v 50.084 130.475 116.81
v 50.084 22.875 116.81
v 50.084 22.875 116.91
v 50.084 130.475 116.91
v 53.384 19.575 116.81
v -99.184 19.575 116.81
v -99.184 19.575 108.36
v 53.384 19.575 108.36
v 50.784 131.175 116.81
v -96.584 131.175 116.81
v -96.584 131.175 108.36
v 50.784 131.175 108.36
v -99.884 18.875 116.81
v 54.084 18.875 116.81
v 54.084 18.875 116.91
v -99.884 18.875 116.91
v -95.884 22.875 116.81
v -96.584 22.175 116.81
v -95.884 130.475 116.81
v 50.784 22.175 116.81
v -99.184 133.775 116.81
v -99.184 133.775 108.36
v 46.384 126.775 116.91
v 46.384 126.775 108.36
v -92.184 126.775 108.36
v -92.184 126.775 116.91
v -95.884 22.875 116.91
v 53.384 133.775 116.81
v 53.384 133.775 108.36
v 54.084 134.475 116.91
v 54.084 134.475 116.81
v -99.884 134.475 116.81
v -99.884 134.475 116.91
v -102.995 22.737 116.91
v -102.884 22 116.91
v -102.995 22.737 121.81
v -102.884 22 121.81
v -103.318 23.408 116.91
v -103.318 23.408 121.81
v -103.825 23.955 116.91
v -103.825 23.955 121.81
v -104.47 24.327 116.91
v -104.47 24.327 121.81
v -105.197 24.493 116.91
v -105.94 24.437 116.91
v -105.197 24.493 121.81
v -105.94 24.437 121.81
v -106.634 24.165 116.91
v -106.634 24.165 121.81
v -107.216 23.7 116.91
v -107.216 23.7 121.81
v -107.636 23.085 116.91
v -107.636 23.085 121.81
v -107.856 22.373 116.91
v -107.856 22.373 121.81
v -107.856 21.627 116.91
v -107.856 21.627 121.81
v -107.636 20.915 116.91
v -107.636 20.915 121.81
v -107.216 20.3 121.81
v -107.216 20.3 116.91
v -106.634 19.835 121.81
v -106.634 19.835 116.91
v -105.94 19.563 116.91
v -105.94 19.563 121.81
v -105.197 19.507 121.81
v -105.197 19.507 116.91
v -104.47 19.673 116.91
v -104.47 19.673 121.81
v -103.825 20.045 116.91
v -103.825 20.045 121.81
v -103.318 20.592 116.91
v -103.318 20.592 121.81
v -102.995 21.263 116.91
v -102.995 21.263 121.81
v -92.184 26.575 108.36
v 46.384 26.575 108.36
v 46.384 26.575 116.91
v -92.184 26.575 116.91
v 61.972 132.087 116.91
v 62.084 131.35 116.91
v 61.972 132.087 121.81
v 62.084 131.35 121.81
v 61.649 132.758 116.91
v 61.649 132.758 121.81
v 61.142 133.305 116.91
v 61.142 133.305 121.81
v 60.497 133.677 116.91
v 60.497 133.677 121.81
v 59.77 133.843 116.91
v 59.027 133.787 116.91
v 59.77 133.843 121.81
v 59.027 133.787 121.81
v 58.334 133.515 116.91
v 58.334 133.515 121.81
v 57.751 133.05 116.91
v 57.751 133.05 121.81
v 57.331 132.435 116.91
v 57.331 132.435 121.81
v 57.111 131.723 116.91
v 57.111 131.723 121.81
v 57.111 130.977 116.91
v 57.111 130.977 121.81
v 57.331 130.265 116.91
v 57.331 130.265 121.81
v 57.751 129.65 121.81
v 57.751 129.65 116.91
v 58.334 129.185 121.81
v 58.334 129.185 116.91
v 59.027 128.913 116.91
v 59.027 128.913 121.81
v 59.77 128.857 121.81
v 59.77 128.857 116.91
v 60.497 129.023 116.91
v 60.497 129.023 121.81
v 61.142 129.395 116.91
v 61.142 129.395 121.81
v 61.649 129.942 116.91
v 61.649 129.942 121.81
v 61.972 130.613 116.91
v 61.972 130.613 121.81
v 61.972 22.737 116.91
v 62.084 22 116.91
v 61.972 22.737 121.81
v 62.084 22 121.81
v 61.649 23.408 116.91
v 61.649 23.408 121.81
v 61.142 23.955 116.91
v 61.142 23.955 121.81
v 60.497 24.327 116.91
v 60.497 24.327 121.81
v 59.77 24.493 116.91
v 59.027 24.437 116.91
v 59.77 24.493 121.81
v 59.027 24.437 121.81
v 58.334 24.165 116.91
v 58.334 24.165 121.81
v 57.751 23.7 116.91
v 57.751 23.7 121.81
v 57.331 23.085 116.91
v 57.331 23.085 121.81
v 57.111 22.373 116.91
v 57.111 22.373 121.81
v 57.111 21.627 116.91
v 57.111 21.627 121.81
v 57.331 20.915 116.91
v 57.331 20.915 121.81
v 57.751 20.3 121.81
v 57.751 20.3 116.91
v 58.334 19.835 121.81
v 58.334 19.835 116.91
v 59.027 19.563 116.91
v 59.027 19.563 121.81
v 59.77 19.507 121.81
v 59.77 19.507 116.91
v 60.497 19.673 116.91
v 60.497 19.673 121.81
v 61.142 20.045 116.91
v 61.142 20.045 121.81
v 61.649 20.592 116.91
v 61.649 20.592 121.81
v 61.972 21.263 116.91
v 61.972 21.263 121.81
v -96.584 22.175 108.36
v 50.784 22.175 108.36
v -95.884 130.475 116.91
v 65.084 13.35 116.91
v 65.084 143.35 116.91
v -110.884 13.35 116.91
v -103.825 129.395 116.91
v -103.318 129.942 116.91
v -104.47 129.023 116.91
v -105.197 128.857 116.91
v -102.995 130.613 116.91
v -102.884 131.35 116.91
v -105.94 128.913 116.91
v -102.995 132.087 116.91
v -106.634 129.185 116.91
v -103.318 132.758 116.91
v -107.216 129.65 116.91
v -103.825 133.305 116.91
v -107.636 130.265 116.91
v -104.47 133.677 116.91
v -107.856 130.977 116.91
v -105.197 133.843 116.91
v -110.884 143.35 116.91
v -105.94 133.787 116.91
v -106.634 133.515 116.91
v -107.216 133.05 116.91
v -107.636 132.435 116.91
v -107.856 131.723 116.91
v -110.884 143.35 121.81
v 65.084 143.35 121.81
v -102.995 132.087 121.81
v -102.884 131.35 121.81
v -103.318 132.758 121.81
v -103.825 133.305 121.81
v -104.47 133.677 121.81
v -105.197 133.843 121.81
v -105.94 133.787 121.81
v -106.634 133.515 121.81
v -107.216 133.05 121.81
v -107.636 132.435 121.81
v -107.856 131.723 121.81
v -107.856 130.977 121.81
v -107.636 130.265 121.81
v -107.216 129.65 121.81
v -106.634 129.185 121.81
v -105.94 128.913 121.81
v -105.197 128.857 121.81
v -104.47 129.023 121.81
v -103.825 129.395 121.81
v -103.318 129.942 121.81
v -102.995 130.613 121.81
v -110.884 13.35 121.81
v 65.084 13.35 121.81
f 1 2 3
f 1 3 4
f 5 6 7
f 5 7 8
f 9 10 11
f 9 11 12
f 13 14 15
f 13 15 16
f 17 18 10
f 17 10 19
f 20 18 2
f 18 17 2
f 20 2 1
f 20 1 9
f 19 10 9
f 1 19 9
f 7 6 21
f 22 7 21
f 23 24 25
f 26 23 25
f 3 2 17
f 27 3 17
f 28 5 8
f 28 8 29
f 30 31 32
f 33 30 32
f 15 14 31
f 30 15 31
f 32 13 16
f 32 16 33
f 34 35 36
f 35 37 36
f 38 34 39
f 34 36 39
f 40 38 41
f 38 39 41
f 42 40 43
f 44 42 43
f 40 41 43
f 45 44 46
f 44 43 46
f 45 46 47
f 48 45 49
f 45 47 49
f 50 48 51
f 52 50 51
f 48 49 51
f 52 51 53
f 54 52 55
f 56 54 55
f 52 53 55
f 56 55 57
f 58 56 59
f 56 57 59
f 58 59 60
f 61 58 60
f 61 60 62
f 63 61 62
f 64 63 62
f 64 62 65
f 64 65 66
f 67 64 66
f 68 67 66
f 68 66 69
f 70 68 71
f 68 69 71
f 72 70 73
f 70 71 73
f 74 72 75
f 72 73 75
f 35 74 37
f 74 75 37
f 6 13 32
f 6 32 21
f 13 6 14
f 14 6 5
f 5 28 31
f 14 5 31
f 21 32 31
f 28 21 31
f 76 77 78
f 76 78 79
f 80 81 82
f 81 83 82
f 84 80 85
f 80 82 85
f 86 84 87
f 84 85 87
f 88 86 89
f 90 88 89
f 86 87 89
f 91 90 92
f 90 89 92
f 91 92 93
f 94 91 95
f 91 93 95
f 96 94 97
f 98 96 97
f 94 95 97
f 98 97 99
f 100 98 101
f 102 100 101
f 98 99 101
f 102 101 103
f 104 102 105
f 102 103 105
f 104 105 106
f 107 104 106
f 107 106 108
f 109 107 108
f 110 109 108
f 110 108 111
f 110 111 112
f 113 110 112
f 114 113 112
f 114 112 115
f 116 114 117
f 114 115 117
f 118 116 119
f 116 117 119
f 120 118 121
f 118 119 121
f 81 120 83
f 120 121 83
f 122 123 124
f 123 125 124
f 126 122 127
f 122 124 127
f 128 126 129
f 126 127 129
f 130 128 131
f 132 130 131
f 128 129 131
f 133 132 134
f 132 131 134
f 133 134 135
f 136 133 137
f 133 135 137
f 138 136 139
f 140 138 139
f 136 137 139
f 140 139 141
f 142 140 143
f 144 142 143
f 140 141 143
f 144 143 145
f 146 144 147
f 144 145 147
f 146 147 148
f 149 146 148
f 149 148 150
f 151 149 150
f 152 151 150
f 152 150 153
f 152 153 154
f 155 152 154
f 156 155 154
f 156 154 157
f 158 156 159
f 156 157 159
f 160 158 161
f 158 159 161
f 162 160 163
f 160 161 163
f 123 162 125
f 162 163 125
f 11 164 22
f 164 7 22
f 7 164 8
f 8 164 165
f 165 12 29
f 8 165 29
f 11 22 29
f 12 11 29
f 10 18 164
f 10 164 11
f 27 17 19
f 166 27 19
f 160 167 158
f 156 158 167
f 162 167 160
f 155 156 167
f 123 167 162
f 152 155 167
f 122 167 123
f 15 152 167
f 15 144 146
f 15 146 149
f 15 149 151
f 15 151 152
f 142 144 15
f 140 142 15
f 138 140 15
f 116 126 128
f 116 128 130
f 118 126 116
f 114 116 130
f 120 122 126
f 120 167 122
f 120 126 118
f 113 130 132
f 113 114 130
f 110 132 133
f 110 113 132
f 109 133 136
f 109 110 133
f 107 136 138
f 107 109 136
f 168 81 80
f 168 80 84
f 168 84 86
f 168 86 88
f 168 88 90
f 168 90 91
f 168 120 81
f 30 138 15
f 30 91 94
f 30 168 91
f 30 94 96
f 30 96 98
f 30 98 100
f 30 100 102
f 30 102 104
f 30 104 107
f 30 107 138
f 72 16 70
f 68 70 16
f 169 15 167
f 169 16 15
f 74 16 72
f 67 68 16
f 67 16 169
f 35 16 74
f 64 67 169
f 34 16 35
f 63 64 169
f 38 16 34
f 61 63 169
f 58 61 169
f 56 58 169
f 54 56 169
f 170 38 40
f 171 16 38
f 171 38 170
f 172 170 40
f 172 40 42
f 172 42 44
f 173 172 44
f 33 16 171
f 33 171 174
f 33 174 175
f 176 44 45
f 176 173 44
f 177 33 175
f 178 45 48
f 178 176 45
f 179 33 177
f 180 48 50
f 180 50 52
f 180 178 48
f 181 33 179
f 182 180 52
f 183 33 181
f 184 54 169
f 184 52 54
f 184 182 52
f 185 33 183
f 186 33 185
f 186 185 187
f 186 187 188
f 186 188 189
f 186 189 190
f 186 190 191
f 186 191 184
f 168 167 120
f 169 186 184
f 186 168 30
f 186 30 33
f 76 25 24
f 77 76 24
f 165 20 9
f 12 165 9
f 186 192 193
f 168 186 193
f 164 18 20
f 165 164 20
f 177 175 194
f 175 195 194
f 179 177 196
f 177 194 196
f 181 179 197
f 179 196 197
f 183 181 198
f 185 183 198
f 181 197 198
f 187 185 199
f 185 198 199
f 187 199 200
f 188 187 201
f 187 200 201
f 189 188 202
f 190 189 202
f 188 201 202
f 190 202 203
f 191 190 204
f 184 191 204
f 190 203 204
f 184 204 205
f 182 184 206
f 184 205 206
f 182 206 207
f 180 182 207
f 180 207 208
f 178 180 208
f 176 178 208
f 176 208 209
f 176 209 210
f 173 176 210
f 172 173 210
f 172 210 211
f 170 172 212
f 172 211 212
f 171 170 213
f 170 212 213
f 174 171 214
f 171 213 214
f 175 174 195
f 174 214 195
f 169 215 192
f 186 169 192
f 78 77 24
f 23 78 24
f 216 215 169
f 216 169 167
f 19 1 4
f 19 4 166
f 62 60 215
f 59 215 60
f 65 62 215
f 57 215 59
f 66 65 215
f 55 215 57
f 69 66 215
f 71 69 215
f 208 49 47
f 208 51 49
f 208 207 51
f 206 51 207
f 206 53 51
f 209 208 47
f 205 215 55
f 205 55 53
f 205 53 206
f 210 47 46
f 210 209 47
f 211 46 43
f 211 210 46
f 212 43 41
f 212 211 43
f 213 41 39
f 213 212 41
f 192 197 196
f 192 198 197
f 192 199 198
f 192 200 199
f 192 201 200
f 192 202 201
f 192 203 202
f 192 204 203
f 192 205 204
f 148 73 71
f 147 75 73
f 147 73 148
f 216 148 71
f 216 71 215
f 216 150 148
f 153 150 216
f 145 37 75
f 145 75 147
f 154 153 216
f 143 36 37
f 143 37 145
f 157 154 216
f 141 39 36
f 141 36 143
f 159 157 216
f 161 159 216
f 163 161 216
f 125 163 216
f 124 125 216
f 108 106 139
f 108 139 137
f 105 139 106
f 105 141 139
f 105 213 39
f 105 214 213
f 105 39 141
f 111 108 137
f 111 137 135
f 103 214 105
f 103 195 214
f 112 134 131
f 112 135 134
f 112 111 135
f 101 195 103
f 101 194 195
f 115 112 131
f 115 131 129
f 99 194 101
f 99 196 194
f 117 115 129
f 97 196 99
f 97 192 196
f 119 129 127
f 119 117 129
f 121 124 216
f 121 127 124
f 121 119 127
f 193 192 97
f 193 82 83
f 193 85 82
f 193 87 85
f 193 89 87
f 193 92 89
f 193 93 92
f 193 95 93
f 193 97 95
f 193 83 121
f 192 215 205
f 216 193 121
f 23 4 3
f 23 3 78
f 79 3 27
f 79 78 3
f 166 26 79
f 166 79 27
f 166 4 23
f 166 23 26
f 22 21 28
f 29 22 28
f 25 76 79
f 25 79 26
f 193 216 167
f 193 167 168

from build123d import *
from OCP.BRepFilletAPI import BRepFilletAPI_MakeChamfer

# Parameters (mm, degrees)
SKETCH1_R               = 172.5
BOSS_EXTRUDE1_DEPTH     = 10
SKETCH2_R               = 48.41
CUT_EXTRUDE1_DEPTH      = 10
BOSS_EXTRUDE2_DEPTH     = 5
CUT_EXTRUDE2_DEPTH      = 497
CUT_EXTRUDE6_START      = -497
CUT_EXTRUDE6_DEPTH      = 497
SKETCH6_W               = 195.767044214
SKETCH6_H               = 55
SKETCH6_W_2             = 185.767044214
SKETCH6_H_2             = 45
BOSS_EXTRUDE3_DEPTH     = 133.35
SKETCH7_W               = 185.767044214
SKETCH7_H               = 45
BOSS_EXTRUDE4_DEPTH     = 5
BOSS_EXTRUDE5_DEPTH     = 8
CHAMFER1_SIZE           = 8
CHAMFER1_SIZE2          = 6.250285012
CHAMFER1_PART_2_SIZE    = 8
CHAMFER1_PART_2_SIZE2   = 6.250285012
CHAMFER1_PART_3_SIZE    = 8
CHAMFER1_PART_3_SIZE2   = 6.250285012
FILLET1_R               = 38
SKETCH9_R               = 374.079334695
CUT_EXTRUDE7_DEPTH      = 93
CUT_EXTRUDE8_DEPTH      = 93
CUT_EXTRUDE8_DEPTH_BACK = 93
SKETCH10_R              = 229.38613092
SKETCH10_R_2            = 152.4
SKETCH11_W              = 291.443368419
SKETCH11_H              = 134.798764099
SKETCH11_W_2            = 144.967044214
SKETCH11_H_2            = 55
CUT_EXTRUDE9_DEPTH      = 143
SKETCH12_W              = 5
SKETCH12_H              = 55
BOSS_EXTRUDE6_DEPTH     = 133.35
SKETCH13_R              = 10
CUT_EXTRUDE10_DEPTH     = 58
SKETCH14_W              = 139.967044214
SKETCH14_H              = 45
BOSS_EXTRUDE7_DEPTH     = 5
SKETCH15_W              = 139.967044214
SKETCH15_H              = 123.35
CUT_EXTRUDE11_DEPTH     = 13
SKETCH16_W              = 10
SKETCH16_H              = 133.35
SKETCH16_W_2            = 149.967044214
BOSS_EXTRUDE9_DEPTH     = 17
SKETCH17_W              = 153.967044214
SKETCH17_H              = 115.6
SKETCH17_W_2            = 145.967044214
SKETCH17_H_2            = 107.6
CUT_EXTRUDE12_DEPTH     = 10
CHAMFER2_SIZE           = 10
CHAMFER2_SIZE2          = 5.773502692
SKETCH24_R              = 15
CUT_EXTRUDE16_DEPTH     = 177.5
SKETCH20_W              = 169.967044214
SKETCH20_H              = 3.35
CUT_EXTRUDE17_DEPTH     = 177.5
SKETCH25_W              = 139.967044214
SKETCH25_H              = 38.773502692
BOSS_EXTRUDE11_DEPTH    = 5
SKETCH26_W              = 3
SKETCH26_H              = 130
BOSS_EXTRUDE12_DEPTH    = 17
SKETCH18_R              = 2.5
CUT_EXTRUDE19_DEPTH     = 26
SKETCH27_W              = 152.567044214
SKETCH27_H              = 114.2
SKETCH27_W_2            = 147.367044214
SKETCH27_H_2            = 109
BOSS_EXTRUDE13_DEPTH    = 8.45
SKETCH27_W_3            = 138.567044214
SKETCH27_H_3            = 100.2
BOSS_EXTRUDE13_2_DEPTH  = 8.45
BOSS_EXTRUDE14_START    = 5
SKETCH28_W              = 175.967044214
SKETCH28_H              = 130
SKETCH28_R              = 2.5
BOSS_EXTRUDE14_DEPTH    = 5
SKETCH29_W              = 292.528596907
SKETCH29_H              = 171.315367969
CUT_EXTRUDE20_DEPTH     = 46.55
SKETCH30_W              = 175.967044214
SKETCH30_H              = 130
SKETCH30_W_2            = 153.967044214
SKETCH30_H_2            = 115.6
SKETCH30_W_3            = 145.967044214
SKETCH30_H_3            = 107.6
SKETCH30_W_4            = 138.567044214
SKETCH30_H_4            = 100.2
CUT_EXTRUDE23_DEPTH     = 8.55


with BuildPart() as part:
    # Sketch1 → Boss-Extrude1 (new body)
    with BuildSketch(Plane(origin=(0, 0, 0), x_dir=(1, 0, 0), z_dir=(0, 1, 0))):
        with Locations(Location((0, 0, 0), (0, 0, 270))):
            Circle(SKETCH1_R)
    extrude(amount=BOSS_EXTRUDE1_DEPTH)

    # Sketch2 → Cut-Extrude1 (cut)
    with BuildSketch(Plane(origin=(0, 10, 0), x_dir=(1, 0, 0), z_dir=(0, 1, 0))):
        with Locations((-75.91, -178.72)):
            Circle(SKETCH2_R)
        with Locations((75.91, -178.72)):
            Circle(SKETCH2_R)
    extrude(amount=-CUT_EXTRUDE1_DEPTH, mode=Mode.SUBTRACT)

    # Sketch3 → Boss-Extrude2 (add)
    with BuildSketch(Plane(origin=(0, 10, 0), x_dir=(1, 0, 0), z_dir=(0, 1, 0))):
        with BuildLine():
            Line((-98.968297449, -119.81), (98.968297449, -119.81))
            ThreePointArc((98.968297449, -119.81), (0, 155.4), (-98.968297449, -119.81))
        make_face()
        with BuildLine():
            ThreePointArc((97.883522107, -116.81), (0, 152.4), (-97.883522107, -116.81))
            Line((-97.883522107, -116.81), (97.883522107, -116.81))
        make_face(mode=Mode.SUBTRACT)
    extrude(amount=BOSS_EXTRUDE2_DEPTH)

    # Sketch4 → Cut-Extrude2 (cut)
    with BuildSketch(Plane(origin=(0, 10, 0), x_dir=(1, 0, 0), z_dir=(0, 1, 0))):
        Polygon((-28.261160255, -170.169200565), (28.261160255, -170.169200565), (28.261160255, -183.836149753), (-30.300470404, -183.836149753), align=None)
    extrude(amount=-CUT_EXTRUDE2_DEPTH, mode=Mode.SUBTRACT)

    # Sketch5 → Cut-Extrude6 (cut)
    with BuildSketch(Plane(origin=(0, 10, 0), x_dir=(1, 0, 0), z_dir=(0, 1, 0)).offset(CUT_EXTRUDE6_START)):
        with BuildLine():
            ThreePointArc((26.702080818, 170.420799435), (0, 172.5), (-26.702080818, 170.420799435))
            Line((-26.702080818, 170.420799435), (26.702080818, 170.420799435))
        make_face()
        with BuildLine():
            ThreePointArc((166.525, -45.007492432), (172.5, 0), (166.525, 45.007492432))
            Line((166.525, 45.007492432), (166.525, -45.007492432))
        make_face()
        with BuildLine():
            Line((-166.525, -45.007492432), (-166.525, 45.007492432))
            ThreePointArc((-166.525, 45.007492432), (-172.5, 0), (-166.525, -45.007492432))
        make_face()
    extrude(amount=CUT_EXTRUDE6_DEPTH, mode=Mode.SUBTRACT)

    # Sketch6 → Boss-Extrude3 (add)
    with BuildSketch(Plane(origin=(0, 10, 0), x_dir=(1, 0, 0), z_dir=(0, 1, 0))):
        with Locations((0, -89.31)):
            Rectangle(SKETCH6_W, SKETCH6_H)
        with Locations((0, -89.31)):
            Rectangle(SKETCH6_W_2, SKETCH6_H_2, mode=Mode.SUBTRACT)
    extrude(amount=BOSS_EXTRUDE3_DEPTH)

    # Sketch7 → Boss-Extrude4 (add)
    with BuildSketch(Plane(origin=(0, 10, 0), x_dir=(1, 0, 0), z_dir=(0, 1, 0))):
        with Locations((0, -89.31)):
            Rectangle(SKETCH7_W, SKETCH7_H)
    extrude(amount=BOSS_EXTRUDE4_DEPTH)

    # Sketch8 → Boss-Extrude5 (add)
    with BuildSketch(Plane(origin=(0, 10, 0), x_dir=(1, 0, 0), z_dir=(0, 1, 0))):
        with BuildLine():
            Line((-97.883522107, -61.81), (-112.883522107, -61.81))
            Line((-112.883522107, -61.81), (-112.883522107, -101.267136509))
            ThreePointArc((-112.883522107, -101.267136509), (-105.634768892, -108.807252061), (-97.883522107, -115.829782871))
            Line((-97.883522107, -115.829782871), (-97.883522107, -61.81))
        make_face()
        with BuildLine():
            Line((-88.028513968, -46.81), (-88.028513968, -61.81))
            Line((-88.028513968, -61.81), (97.883522107, -61.81))
            Line((97.883522107, -61.81), (97.883522107, -115.829782871))
            ThreePointArc((97.883522107, -115.829782871), (105.634768892, -108.807252061), (112.883522107, -101.267136509))
            Line((112.883522107, -101.267136509), (112.883522107, -46.81))
            Line((112.883522107, -46.81), (-88.028513968, -46.81))
        make_face()
    extrude(amount=BOSS_EXTRUDE5_DEPTH)

    # Chamfer1
    chamfer1_edges = [part.edges().sort_by_distance(p)[0] for p in [
        (-97.883522107, 18, 88.819891436),
    ]]
    chamfer1_side = [part.faces().sort_by_distance(p)[0] for p in [
        (-97.883522107, 80.599247918, 89.340686997),
    ]]
    chamfer(chamfer1_edges, length=CHAMFER1_SIZE, length2=CHAMFER1_SIZE2, reference=chamfer1_side[0])

    # Chamfer1 part 2
    chamfer1_part_2_edges = [part.edges().sort_by_distance(p)[0] for p in [
        (4.927504069, 18, 61.81),
    ]]
    chamfer1_part_2_side = [part.faces().sort_by_distance(p)[0] for p in [
        (-0.807441513, 80.139082253, 61.81),
    ]]
    chamfer(chamfer1_part_2_edges, length=CHAMFER1_PART_2_SIZE, length2=CHAMFER1_PART_2_SIZE2, reference=chamfer1_part_2_side[0])

    # Chamfer1 part 3
    chamfer1_part_3_edges = [part.edges().sort_by_distance(p)[0] for p in [
        (97.883522107, 18, 88.819891436),
    ]]
    chamfer1_part_3_side = [part.faces().sort_by_distance(p)[0] for p in [
        (97.883522107, 80.599247918, 89.340686997),
    ]]
    chamfer(chamfer1_part_3_edges, length=CHAMFER1_PART_3_SIZE, length2=CHAMFER1_PART_3_SIZE2, reference=chamfer1_part_3_side[0])

    # Fillet1
    # the kernel refuses this fillet: 38 mm, written as the material it adds along each edge
    with BuildSketch(Plane(origin=(-97.883522107, 26, 148.028657271), x_dir=(-0.61566147532566, -0.7880107536067207, 0), z_dir=(0, 0, -1))) as fillet1_piece_1_section:
        with BuildLine():
            CenterArc((13.24591235, 37.873851244), FILLET1_R, 232, 33.330100487)
            Line((-10.149223713, 7.929442607), (0, 0))
            Line((0, 0), (10.152145721, 0))
        make_face()
    fillet1_piece_1 = extrude(amount=86.218657271, mode=Mode.PRIVATE)
    fillet1_piece_1 = fillet1_piece_1 & Plane(origin=(0, 26, 0), x_dir=(-0.7443687577094257, 0, 0.6677687867414337), z_dir=(0, -1, 0)) * Cylinder(151.65, 214, mode=Mode.PRIVATE)
    add(fillet1_piece_1)
    with BuildSketch(Plane(origin=(-88.028513968, 26, 61.81), x_dir=(0, 1, 0), z_dir=(1, 0, 0))) as fillet1_piece_2_section:
        with BuildLine():
            CenterArc((12.87954976, -38), FILLET1_R, 90, 33.330100487)
            Line((-8, -6.250285012), (0, 0))
            Line((0, 0), (12.87954976, 0))
        make_face()
    fillet1_piece_2 = extrude(amount=218.110910475, mode=Mode.PRIVATE)
    fillet1_piece_2 = fillet1_piece_2 - Plane(origin=(135.883522107, 38.87954976, 61.81), x_dir=(-0.8355188154722692, -0.5494618357919104, 0), z_dir=(0, 0, -1)) * Cylinder(38, 488, mode=Mode.PRIVATE)
    add(fillet1_piece_2)
    with BuildSketch(Plane(origin=(97.883522107, 26, 29.6111256), x_dir=(0.61566147532566, -0.7880107536067207, 0), z_dir=(0, 0, 1))) as fillet1_piece_3_section:
        with BuildLine():
            CenterArc((13.24591235, 37.873851244), FILLET1_R, 232, 33.330100487)
            Line((-10.149223713, 7.929442607), (0, 0))
            Line((0, 0), (10.152145721, 0))
        make_face()
    fillet1_piece_3 = extrude(amount=118.417531672, mode=Mode.PRIVATE)
    fillet1_piece_3 = fillet1_piece_3 & Plane(origin=(0, 26, 0), x_dir=(0.6454567893612635, 0, 0.7637967878090673), z_dir=(0, -1, 0)) * Cylinder(151.65, 278, mode=Mode.PRIVATE)
    fillet1_piece_3 = fillet1_piece_3 - Plane(origin=(97.883522107, 38.87954976, 23.81), x_dir=(0, 0, 1), z_dir=(-1, 0, 0)) * Cylinder(38, 278, mode=Mode.PRIVATE)
    add(fillet1_piece_3)

    # Sketch9 → Cut-Extrude7 (cut)
    with BuildSketch(Plane(origin=(0, 10, 0), x_dir=(1, 0, 0), z_dir=(0, 1, 0))):
        Circle(SKETCH9_R)
    extrude(amount=-CUT_EXTRUDE7_DEPTH, mode=Mode.SUBTRACT)

    # Sketch10 → Cut-Extrude8 (cut, two sides: drawn at the far end of the back side and taken through both)
    with BuildSketch(Plane.XZ.offset(-10).offset(-CUT_EXTRUDE8_DEPTH_BACK)):
        Circle(SKETCH10_R)
        Circle(SKETCH10_R_2, mode=Mode.SUBTRACT)
    extrude(amount=CUT_EXTRUDE8_DEPTH + CUT_EXTRUDE8_DEPTH_BACK, mode=Mode.SUBTRACT)

    # Sketch11 → Cut-Extrude9 (cut)
    with BuildSketch(Plane(origin=(0, 143.35, 0), x_dir=(1, 0, 0), z_dir=(0, 1, 0))):
        with Locations((4.840839595, -88.771460056)):
            Rectangle(SKETCH11_W, SKETCH11_H)
        with Locations((-25.4, -89.31)):
            Rectangle(SKETCH11_W_2, SKETCH11_H_2, mode=Mode.SUBTRACT)
    extrude(amount=-CUT_EXTRUDE9_DEPTH, mode=Mode.SUBTRACT)

    # Sketch12 → Boss-Extrude6 (add)
    with BuildSketch(Plane(origin=(0, 143.35, 0), x_dir=(1, 0, 0), z_dir=(0, 1, 0))):
        with Locations((49.583522107, -89.31)):
            Rectangle(SKETCH12_W, SKETCH12_H)
    extrude(amount=-BOSS_EXTRUDE6_DEPTH)

    # Sketch13 → Cut-Extrude10 (cut)
    with BuildSketch(Plane.ZY.offset(97.883522107)):
        with Locations((89.418847681, 75)):
            Circle(SKETCH13_R)
    extrude(amount=-CUT_EXTRUDE10_DEPTH, mode=Mode.SUBTRACT)

    # Sketch14 → Boss-Extrude7 (add)
    with BuildSketch(Plane(origin=(0, 143.35, 0), x_dir=(1, 0, 0), z_dir=(0, 1, 0))):
        with Locations((-22.9, -89.31)):
            Rectangle(SKETCH14_W, SKETCH14_H)
    extrude(amount=-BOSS_EXTRUDE7_DEPTH)

    # Sketch15 → Cut-Extrude11 (cut)
    with BuildSketch(Plane.XY.offset(116.81)):
        with Locations((-22.9, 76.675)):
            Rectangle(SKETCH15_W, SKETCH15_H)
    extrude(amount=-CUT_EXTRUDE11_DEPTH, mode=Mode.SUBTRACT)

    # Sketch16 → Boss-Extrude9 (add)
    # profile 1 of 5: a face of its own
    with BuildSketch(Plane.XY.offset(116.81)):
        with Locations((-102.883522107, 76.675)):
            Rectangle(SKETCH16_W, SKETCH16_H)
    # profile 2 of 5: a face of its own
    with BuildSketch(Plane.XY.offset(116.81)):
        with Locations((-22.9, 76.675)):
            Rectangle(SKETCH16_W_2, SKETCH16_H)
        Polygon((-92.883522107, 127.475), (-92.883522107, 138.35), (47.083522107, 138.35), (47.083522107, 127.475), (47.083522107, 76.675), (47.083522107, 25.875), (47.083522107, 15), (-92.883522107, 15), (-92.883522107, 25.875), (-92.883522107, 76.675), align=None, mode=Mode.SUBTRACT)
    # profile 3 of 5: a face of its own
    with BuildSketch(Plane.XY.offset(116.81)):
        with Locations((57.083522107, 76.675)):
            Rectangle(SKETCH16_W, SKETCH16_H)
    # profile 4 of 5: a face of its own
    with BuildSketch(Plane.XY.offset(116.81)):
        Polygon((47.083522107, 138.35), (-92.883522107, 138.35), (-92.883522107, 127.475), (-22.9, 127.475), (47.083522107, 127.475), align=None)
    # profile 5 of 5: a face of its own
    with BuildSketch(Plane.XY.offset(116.81)):
        Polygon((-22.9, 25.875), (-92.883522107, 25.875), (-92.883522107, 15), (47.083522107, 15), (47.083522107, 25.875), align=None)
    extrude(amount=-BOSS_EXTRUDE9_DEPTH)

    # Sketch17 → Cut-Extrude12 (cut)
    with BuildSketch(Plane.XY.offset(116.81)):
        with Locations((-22.9, 76.675)):
            Rectangle(SKETCH17_W, SKETCH17_H)
        with Locations((-22.9, 76.675)):
            Rectangle(SKETCH17_W_2, SKETCH17_H_2, mode=Mode.SUBTRACT)
    extrude(amount=-CUT_EXTRUDE12_DEPTH, mode=Mode.SUBTRACT)

    # Chamfer2: one chamfer whose edges measure the first distance from different faces: ONE call of the kernel's chamfer builder (chamfer() names one face for all edges)
    chamfer2_edges_1 = [part.edges().sort_by_distance(p)[0] for p in [
        (-22.9, 25.875, 99.81),
    ]]
    chamfer2_side_1 = [part.faces().sort_by_distance(p)[0] for p in [
        (-22.9, 25.875, 108.31),
    ]]
    chamfer2_edges_2 = [part.edges().sort_by_distance(p)[0] for p in [
        (-22.9, 127.475, 99.81),
    ]]
    chamfer2_side_2 = [part.faces().sort_by_distance(p)[0] for p in [
        (-22.9, 132.9125, 99.81),
    ]]
    chamfer2 = BRepFilletAPI_MakeChamfer(part.part.solid().wrapped)
    for e in chamfer2_edges_1:
        chamfer2.Add(CHAMFER2_SIZE, CHAMFER2_SIZE2, e.wrapped, chamfer2_side_1[0].wrapped)  # the first distance lies on this face
    for e in chamfer2_edges_2:
        chamfer2.Add(CHAMFER2_SIZE, CHAMFER2_SIZE2, e.wrapped, chamfer2_side_2[0].wrapped)  # the first distance lies on this face
    add(Compound.cast(chamfer2.Shape()), mode=Mode.REPLACE)

    # Sketch24 → Cut-Extrude16 (cut)
    with BuildSketch(Plane.ZY.offset(97.883522107)):
        with Locations((83.81, 75)):
            Circle(SKETCH24_R)
    extrude(amount=-CUT_EXTRUDE16_DEPTH, mode=Mode.SUBTRACT)

    # Sketch20 → Cut-Extrude17 (cut)
    with BuildSketch(Plane.XY.offset(116.81)):
        with Locations((-22.9, 11.675)):
            Rectangle(SKETCH20_W, SKETCH20_H)
    extrude(amount=-CUT_EXTRUDE17_DEPTH, mode=Mode.SUBTRACT)

    # Sketch25 → Boss-Extrude11 (add)
    with BuildSketch(Plane(origin=(0, 13.35, 0), x_dir=(-1, 0, 0), z_dir=(0, -1, 0))):
        with Locations((22.9, -86.196751346)):
            Rectangle(SKETCH25_W, SKETCH25_H)
    extrude(amount=-BOSS_EXTRUDE11_DEPTH)

    # Sketch26 → Boss-Extrude12 (add)
    with BuildSketch(Plane.XY.offset(116.81)):
        with Locations((-109.383522107, 78.35)):
            Rectangle(SKETCH26_W, SKETCH26_H)
        with Locations((63.583522107, 78.35)):
            Rectangle(SKETCH26_W, SKETCH26_H)
    extrude(amount=-BOSS_EXTRUDE12_DEPTH)

    # Sketch18 → Cut-Extrude19 (cut)
    with BuildSketch(Plane.XY.offset(116.81)):
        with Locations((-105.383522107, 22)):
            Circle(SKETCH18_R)
        with Locations((59.583522107, 22)):
            Circle(SKETCH18_R)
        with Locations((59.583522107, 131.35)):
            Circle(SKETCH18_R)
        with Locations((-105.383522107, 131.35)):
            Circle(SKETCH18_R)
    extrude(amount=-CUT_EXTRUDE19_DEPTH, mode=Mode.SUBTRACT)



with BuildPart() as body_2:
    # Sketch27 → Boss-Extrude13 (new body)
    with BuildSketch(Plane.XY.offset(116.81)):
        with Locations((-22.9, 76.675)):
            Rectangle(SKETCH27_W, SKETCH27_H)
        with Locations((-22.9, 76.675)):
            Rectangle(SKETCH27_W_2, SKETCH27_H_2, mode=Mode.SUBTRACT)
    extrude(amount=-BOSS_EXTRUDE13_DEPTH)


with BuildPart() as body_3:
    # Sketch27 → Boss-Extrude13 2 (new body)
    with BuildSketch(Plane.XY.offset(116.81)):
        with Locations((-22.9, 76.675)):
            Rectangle(SKETCH27_W_3, SKETCH27_H_3)
    extrude(amount=-BOSS_EXTRUDE13_2_DEPTH)


with BuildPart() as part_1:
    add(part.part)

    add(body_2.part)  # Boss-Extrude14 merges body 2

    add(body_3.part)  # Boss-Extrude14 merges body 3
    # Sketch28 → Boss-Extrude14 (add)
    with BuildSketch(Plane.XY.offset(116.81).offset(BOSS_EXTRUDE14_START)):
        with Locations((-22.9, 78.35)):
            Rectangle(SKETCH28_W, SKETCH28_H)
        with Locations((-105.383522107, 131.35)):
            Circle(SKETCH28_R, mode=Mode.SUBTRACT)
        with Locations((59.583522107, 131.35)):
            Circle(SKETCH28_R, mode=Mode.SUBTRACT)
        with Locations((59.583522107, 22)):
            Circle(SKETCH28_R, mode=Mode.SUBTRACT)
        with Locations((-105.383522107, 22)):
            Circle(SKETCH28_R, mode=Mode.SUBTRACT)
    extrude(amount=-BOSS_EXTRUDE14_DEPTH)

    # Sketch29 → Cut-Extrude20 (cut)
    with BuildSketch(Plane(origin=(0, 0, 61.81), x_dir=(-1, 0, 0), z_dir=(0, 0, -1))):
        with Locations((7.671703237, 74.887303123)):
            Rectangle(SKETCH29_W, SKETCH29_H)
    extrude(amount=-CUT_EXTRUDE20_DEPTH, mode=Mode.SUBTRACT)

    # Sketch30 → Cut-Extrude23 (cut)
    # profile 1 of 2: a face of its own
    with BuildSketch(Plane(origin=(0, 0, 108.36), x_dir=(-1, 0, 0), z_dir=(0, 0, -1))):
        with Locations((22.9, 78.35)):
            Rectangle(SKETCH30_W, SKETCH30_H)
        with Locations((22.9, 76.675)):
            Rectangle(SKETCH30_W_2, SKETCH30_H_2, mode=Mode.SUBTRACT)
    # profile 2 of 2: a face of its own
    with BuildSketch(Plane(origin=(0, 0, 108.36), x_dir=(-1, 0, 0), z_dir=(0, 0, -1))):
        with Locations((22.9, 76.675)):
            Rectangle(SKETCH30_W_3, SKETCH30_H_3)
        with Locations((22.9, 76.675)):
            Rectangle(SKETCH30_W_4, SKETCH30_H_4, mode=Mode.SUBTRACT)
    extrude(amount=-CUT_EXTRUDE23_DEPTH, mode=Mode.SUBTRACT)


solid = part_1.part
